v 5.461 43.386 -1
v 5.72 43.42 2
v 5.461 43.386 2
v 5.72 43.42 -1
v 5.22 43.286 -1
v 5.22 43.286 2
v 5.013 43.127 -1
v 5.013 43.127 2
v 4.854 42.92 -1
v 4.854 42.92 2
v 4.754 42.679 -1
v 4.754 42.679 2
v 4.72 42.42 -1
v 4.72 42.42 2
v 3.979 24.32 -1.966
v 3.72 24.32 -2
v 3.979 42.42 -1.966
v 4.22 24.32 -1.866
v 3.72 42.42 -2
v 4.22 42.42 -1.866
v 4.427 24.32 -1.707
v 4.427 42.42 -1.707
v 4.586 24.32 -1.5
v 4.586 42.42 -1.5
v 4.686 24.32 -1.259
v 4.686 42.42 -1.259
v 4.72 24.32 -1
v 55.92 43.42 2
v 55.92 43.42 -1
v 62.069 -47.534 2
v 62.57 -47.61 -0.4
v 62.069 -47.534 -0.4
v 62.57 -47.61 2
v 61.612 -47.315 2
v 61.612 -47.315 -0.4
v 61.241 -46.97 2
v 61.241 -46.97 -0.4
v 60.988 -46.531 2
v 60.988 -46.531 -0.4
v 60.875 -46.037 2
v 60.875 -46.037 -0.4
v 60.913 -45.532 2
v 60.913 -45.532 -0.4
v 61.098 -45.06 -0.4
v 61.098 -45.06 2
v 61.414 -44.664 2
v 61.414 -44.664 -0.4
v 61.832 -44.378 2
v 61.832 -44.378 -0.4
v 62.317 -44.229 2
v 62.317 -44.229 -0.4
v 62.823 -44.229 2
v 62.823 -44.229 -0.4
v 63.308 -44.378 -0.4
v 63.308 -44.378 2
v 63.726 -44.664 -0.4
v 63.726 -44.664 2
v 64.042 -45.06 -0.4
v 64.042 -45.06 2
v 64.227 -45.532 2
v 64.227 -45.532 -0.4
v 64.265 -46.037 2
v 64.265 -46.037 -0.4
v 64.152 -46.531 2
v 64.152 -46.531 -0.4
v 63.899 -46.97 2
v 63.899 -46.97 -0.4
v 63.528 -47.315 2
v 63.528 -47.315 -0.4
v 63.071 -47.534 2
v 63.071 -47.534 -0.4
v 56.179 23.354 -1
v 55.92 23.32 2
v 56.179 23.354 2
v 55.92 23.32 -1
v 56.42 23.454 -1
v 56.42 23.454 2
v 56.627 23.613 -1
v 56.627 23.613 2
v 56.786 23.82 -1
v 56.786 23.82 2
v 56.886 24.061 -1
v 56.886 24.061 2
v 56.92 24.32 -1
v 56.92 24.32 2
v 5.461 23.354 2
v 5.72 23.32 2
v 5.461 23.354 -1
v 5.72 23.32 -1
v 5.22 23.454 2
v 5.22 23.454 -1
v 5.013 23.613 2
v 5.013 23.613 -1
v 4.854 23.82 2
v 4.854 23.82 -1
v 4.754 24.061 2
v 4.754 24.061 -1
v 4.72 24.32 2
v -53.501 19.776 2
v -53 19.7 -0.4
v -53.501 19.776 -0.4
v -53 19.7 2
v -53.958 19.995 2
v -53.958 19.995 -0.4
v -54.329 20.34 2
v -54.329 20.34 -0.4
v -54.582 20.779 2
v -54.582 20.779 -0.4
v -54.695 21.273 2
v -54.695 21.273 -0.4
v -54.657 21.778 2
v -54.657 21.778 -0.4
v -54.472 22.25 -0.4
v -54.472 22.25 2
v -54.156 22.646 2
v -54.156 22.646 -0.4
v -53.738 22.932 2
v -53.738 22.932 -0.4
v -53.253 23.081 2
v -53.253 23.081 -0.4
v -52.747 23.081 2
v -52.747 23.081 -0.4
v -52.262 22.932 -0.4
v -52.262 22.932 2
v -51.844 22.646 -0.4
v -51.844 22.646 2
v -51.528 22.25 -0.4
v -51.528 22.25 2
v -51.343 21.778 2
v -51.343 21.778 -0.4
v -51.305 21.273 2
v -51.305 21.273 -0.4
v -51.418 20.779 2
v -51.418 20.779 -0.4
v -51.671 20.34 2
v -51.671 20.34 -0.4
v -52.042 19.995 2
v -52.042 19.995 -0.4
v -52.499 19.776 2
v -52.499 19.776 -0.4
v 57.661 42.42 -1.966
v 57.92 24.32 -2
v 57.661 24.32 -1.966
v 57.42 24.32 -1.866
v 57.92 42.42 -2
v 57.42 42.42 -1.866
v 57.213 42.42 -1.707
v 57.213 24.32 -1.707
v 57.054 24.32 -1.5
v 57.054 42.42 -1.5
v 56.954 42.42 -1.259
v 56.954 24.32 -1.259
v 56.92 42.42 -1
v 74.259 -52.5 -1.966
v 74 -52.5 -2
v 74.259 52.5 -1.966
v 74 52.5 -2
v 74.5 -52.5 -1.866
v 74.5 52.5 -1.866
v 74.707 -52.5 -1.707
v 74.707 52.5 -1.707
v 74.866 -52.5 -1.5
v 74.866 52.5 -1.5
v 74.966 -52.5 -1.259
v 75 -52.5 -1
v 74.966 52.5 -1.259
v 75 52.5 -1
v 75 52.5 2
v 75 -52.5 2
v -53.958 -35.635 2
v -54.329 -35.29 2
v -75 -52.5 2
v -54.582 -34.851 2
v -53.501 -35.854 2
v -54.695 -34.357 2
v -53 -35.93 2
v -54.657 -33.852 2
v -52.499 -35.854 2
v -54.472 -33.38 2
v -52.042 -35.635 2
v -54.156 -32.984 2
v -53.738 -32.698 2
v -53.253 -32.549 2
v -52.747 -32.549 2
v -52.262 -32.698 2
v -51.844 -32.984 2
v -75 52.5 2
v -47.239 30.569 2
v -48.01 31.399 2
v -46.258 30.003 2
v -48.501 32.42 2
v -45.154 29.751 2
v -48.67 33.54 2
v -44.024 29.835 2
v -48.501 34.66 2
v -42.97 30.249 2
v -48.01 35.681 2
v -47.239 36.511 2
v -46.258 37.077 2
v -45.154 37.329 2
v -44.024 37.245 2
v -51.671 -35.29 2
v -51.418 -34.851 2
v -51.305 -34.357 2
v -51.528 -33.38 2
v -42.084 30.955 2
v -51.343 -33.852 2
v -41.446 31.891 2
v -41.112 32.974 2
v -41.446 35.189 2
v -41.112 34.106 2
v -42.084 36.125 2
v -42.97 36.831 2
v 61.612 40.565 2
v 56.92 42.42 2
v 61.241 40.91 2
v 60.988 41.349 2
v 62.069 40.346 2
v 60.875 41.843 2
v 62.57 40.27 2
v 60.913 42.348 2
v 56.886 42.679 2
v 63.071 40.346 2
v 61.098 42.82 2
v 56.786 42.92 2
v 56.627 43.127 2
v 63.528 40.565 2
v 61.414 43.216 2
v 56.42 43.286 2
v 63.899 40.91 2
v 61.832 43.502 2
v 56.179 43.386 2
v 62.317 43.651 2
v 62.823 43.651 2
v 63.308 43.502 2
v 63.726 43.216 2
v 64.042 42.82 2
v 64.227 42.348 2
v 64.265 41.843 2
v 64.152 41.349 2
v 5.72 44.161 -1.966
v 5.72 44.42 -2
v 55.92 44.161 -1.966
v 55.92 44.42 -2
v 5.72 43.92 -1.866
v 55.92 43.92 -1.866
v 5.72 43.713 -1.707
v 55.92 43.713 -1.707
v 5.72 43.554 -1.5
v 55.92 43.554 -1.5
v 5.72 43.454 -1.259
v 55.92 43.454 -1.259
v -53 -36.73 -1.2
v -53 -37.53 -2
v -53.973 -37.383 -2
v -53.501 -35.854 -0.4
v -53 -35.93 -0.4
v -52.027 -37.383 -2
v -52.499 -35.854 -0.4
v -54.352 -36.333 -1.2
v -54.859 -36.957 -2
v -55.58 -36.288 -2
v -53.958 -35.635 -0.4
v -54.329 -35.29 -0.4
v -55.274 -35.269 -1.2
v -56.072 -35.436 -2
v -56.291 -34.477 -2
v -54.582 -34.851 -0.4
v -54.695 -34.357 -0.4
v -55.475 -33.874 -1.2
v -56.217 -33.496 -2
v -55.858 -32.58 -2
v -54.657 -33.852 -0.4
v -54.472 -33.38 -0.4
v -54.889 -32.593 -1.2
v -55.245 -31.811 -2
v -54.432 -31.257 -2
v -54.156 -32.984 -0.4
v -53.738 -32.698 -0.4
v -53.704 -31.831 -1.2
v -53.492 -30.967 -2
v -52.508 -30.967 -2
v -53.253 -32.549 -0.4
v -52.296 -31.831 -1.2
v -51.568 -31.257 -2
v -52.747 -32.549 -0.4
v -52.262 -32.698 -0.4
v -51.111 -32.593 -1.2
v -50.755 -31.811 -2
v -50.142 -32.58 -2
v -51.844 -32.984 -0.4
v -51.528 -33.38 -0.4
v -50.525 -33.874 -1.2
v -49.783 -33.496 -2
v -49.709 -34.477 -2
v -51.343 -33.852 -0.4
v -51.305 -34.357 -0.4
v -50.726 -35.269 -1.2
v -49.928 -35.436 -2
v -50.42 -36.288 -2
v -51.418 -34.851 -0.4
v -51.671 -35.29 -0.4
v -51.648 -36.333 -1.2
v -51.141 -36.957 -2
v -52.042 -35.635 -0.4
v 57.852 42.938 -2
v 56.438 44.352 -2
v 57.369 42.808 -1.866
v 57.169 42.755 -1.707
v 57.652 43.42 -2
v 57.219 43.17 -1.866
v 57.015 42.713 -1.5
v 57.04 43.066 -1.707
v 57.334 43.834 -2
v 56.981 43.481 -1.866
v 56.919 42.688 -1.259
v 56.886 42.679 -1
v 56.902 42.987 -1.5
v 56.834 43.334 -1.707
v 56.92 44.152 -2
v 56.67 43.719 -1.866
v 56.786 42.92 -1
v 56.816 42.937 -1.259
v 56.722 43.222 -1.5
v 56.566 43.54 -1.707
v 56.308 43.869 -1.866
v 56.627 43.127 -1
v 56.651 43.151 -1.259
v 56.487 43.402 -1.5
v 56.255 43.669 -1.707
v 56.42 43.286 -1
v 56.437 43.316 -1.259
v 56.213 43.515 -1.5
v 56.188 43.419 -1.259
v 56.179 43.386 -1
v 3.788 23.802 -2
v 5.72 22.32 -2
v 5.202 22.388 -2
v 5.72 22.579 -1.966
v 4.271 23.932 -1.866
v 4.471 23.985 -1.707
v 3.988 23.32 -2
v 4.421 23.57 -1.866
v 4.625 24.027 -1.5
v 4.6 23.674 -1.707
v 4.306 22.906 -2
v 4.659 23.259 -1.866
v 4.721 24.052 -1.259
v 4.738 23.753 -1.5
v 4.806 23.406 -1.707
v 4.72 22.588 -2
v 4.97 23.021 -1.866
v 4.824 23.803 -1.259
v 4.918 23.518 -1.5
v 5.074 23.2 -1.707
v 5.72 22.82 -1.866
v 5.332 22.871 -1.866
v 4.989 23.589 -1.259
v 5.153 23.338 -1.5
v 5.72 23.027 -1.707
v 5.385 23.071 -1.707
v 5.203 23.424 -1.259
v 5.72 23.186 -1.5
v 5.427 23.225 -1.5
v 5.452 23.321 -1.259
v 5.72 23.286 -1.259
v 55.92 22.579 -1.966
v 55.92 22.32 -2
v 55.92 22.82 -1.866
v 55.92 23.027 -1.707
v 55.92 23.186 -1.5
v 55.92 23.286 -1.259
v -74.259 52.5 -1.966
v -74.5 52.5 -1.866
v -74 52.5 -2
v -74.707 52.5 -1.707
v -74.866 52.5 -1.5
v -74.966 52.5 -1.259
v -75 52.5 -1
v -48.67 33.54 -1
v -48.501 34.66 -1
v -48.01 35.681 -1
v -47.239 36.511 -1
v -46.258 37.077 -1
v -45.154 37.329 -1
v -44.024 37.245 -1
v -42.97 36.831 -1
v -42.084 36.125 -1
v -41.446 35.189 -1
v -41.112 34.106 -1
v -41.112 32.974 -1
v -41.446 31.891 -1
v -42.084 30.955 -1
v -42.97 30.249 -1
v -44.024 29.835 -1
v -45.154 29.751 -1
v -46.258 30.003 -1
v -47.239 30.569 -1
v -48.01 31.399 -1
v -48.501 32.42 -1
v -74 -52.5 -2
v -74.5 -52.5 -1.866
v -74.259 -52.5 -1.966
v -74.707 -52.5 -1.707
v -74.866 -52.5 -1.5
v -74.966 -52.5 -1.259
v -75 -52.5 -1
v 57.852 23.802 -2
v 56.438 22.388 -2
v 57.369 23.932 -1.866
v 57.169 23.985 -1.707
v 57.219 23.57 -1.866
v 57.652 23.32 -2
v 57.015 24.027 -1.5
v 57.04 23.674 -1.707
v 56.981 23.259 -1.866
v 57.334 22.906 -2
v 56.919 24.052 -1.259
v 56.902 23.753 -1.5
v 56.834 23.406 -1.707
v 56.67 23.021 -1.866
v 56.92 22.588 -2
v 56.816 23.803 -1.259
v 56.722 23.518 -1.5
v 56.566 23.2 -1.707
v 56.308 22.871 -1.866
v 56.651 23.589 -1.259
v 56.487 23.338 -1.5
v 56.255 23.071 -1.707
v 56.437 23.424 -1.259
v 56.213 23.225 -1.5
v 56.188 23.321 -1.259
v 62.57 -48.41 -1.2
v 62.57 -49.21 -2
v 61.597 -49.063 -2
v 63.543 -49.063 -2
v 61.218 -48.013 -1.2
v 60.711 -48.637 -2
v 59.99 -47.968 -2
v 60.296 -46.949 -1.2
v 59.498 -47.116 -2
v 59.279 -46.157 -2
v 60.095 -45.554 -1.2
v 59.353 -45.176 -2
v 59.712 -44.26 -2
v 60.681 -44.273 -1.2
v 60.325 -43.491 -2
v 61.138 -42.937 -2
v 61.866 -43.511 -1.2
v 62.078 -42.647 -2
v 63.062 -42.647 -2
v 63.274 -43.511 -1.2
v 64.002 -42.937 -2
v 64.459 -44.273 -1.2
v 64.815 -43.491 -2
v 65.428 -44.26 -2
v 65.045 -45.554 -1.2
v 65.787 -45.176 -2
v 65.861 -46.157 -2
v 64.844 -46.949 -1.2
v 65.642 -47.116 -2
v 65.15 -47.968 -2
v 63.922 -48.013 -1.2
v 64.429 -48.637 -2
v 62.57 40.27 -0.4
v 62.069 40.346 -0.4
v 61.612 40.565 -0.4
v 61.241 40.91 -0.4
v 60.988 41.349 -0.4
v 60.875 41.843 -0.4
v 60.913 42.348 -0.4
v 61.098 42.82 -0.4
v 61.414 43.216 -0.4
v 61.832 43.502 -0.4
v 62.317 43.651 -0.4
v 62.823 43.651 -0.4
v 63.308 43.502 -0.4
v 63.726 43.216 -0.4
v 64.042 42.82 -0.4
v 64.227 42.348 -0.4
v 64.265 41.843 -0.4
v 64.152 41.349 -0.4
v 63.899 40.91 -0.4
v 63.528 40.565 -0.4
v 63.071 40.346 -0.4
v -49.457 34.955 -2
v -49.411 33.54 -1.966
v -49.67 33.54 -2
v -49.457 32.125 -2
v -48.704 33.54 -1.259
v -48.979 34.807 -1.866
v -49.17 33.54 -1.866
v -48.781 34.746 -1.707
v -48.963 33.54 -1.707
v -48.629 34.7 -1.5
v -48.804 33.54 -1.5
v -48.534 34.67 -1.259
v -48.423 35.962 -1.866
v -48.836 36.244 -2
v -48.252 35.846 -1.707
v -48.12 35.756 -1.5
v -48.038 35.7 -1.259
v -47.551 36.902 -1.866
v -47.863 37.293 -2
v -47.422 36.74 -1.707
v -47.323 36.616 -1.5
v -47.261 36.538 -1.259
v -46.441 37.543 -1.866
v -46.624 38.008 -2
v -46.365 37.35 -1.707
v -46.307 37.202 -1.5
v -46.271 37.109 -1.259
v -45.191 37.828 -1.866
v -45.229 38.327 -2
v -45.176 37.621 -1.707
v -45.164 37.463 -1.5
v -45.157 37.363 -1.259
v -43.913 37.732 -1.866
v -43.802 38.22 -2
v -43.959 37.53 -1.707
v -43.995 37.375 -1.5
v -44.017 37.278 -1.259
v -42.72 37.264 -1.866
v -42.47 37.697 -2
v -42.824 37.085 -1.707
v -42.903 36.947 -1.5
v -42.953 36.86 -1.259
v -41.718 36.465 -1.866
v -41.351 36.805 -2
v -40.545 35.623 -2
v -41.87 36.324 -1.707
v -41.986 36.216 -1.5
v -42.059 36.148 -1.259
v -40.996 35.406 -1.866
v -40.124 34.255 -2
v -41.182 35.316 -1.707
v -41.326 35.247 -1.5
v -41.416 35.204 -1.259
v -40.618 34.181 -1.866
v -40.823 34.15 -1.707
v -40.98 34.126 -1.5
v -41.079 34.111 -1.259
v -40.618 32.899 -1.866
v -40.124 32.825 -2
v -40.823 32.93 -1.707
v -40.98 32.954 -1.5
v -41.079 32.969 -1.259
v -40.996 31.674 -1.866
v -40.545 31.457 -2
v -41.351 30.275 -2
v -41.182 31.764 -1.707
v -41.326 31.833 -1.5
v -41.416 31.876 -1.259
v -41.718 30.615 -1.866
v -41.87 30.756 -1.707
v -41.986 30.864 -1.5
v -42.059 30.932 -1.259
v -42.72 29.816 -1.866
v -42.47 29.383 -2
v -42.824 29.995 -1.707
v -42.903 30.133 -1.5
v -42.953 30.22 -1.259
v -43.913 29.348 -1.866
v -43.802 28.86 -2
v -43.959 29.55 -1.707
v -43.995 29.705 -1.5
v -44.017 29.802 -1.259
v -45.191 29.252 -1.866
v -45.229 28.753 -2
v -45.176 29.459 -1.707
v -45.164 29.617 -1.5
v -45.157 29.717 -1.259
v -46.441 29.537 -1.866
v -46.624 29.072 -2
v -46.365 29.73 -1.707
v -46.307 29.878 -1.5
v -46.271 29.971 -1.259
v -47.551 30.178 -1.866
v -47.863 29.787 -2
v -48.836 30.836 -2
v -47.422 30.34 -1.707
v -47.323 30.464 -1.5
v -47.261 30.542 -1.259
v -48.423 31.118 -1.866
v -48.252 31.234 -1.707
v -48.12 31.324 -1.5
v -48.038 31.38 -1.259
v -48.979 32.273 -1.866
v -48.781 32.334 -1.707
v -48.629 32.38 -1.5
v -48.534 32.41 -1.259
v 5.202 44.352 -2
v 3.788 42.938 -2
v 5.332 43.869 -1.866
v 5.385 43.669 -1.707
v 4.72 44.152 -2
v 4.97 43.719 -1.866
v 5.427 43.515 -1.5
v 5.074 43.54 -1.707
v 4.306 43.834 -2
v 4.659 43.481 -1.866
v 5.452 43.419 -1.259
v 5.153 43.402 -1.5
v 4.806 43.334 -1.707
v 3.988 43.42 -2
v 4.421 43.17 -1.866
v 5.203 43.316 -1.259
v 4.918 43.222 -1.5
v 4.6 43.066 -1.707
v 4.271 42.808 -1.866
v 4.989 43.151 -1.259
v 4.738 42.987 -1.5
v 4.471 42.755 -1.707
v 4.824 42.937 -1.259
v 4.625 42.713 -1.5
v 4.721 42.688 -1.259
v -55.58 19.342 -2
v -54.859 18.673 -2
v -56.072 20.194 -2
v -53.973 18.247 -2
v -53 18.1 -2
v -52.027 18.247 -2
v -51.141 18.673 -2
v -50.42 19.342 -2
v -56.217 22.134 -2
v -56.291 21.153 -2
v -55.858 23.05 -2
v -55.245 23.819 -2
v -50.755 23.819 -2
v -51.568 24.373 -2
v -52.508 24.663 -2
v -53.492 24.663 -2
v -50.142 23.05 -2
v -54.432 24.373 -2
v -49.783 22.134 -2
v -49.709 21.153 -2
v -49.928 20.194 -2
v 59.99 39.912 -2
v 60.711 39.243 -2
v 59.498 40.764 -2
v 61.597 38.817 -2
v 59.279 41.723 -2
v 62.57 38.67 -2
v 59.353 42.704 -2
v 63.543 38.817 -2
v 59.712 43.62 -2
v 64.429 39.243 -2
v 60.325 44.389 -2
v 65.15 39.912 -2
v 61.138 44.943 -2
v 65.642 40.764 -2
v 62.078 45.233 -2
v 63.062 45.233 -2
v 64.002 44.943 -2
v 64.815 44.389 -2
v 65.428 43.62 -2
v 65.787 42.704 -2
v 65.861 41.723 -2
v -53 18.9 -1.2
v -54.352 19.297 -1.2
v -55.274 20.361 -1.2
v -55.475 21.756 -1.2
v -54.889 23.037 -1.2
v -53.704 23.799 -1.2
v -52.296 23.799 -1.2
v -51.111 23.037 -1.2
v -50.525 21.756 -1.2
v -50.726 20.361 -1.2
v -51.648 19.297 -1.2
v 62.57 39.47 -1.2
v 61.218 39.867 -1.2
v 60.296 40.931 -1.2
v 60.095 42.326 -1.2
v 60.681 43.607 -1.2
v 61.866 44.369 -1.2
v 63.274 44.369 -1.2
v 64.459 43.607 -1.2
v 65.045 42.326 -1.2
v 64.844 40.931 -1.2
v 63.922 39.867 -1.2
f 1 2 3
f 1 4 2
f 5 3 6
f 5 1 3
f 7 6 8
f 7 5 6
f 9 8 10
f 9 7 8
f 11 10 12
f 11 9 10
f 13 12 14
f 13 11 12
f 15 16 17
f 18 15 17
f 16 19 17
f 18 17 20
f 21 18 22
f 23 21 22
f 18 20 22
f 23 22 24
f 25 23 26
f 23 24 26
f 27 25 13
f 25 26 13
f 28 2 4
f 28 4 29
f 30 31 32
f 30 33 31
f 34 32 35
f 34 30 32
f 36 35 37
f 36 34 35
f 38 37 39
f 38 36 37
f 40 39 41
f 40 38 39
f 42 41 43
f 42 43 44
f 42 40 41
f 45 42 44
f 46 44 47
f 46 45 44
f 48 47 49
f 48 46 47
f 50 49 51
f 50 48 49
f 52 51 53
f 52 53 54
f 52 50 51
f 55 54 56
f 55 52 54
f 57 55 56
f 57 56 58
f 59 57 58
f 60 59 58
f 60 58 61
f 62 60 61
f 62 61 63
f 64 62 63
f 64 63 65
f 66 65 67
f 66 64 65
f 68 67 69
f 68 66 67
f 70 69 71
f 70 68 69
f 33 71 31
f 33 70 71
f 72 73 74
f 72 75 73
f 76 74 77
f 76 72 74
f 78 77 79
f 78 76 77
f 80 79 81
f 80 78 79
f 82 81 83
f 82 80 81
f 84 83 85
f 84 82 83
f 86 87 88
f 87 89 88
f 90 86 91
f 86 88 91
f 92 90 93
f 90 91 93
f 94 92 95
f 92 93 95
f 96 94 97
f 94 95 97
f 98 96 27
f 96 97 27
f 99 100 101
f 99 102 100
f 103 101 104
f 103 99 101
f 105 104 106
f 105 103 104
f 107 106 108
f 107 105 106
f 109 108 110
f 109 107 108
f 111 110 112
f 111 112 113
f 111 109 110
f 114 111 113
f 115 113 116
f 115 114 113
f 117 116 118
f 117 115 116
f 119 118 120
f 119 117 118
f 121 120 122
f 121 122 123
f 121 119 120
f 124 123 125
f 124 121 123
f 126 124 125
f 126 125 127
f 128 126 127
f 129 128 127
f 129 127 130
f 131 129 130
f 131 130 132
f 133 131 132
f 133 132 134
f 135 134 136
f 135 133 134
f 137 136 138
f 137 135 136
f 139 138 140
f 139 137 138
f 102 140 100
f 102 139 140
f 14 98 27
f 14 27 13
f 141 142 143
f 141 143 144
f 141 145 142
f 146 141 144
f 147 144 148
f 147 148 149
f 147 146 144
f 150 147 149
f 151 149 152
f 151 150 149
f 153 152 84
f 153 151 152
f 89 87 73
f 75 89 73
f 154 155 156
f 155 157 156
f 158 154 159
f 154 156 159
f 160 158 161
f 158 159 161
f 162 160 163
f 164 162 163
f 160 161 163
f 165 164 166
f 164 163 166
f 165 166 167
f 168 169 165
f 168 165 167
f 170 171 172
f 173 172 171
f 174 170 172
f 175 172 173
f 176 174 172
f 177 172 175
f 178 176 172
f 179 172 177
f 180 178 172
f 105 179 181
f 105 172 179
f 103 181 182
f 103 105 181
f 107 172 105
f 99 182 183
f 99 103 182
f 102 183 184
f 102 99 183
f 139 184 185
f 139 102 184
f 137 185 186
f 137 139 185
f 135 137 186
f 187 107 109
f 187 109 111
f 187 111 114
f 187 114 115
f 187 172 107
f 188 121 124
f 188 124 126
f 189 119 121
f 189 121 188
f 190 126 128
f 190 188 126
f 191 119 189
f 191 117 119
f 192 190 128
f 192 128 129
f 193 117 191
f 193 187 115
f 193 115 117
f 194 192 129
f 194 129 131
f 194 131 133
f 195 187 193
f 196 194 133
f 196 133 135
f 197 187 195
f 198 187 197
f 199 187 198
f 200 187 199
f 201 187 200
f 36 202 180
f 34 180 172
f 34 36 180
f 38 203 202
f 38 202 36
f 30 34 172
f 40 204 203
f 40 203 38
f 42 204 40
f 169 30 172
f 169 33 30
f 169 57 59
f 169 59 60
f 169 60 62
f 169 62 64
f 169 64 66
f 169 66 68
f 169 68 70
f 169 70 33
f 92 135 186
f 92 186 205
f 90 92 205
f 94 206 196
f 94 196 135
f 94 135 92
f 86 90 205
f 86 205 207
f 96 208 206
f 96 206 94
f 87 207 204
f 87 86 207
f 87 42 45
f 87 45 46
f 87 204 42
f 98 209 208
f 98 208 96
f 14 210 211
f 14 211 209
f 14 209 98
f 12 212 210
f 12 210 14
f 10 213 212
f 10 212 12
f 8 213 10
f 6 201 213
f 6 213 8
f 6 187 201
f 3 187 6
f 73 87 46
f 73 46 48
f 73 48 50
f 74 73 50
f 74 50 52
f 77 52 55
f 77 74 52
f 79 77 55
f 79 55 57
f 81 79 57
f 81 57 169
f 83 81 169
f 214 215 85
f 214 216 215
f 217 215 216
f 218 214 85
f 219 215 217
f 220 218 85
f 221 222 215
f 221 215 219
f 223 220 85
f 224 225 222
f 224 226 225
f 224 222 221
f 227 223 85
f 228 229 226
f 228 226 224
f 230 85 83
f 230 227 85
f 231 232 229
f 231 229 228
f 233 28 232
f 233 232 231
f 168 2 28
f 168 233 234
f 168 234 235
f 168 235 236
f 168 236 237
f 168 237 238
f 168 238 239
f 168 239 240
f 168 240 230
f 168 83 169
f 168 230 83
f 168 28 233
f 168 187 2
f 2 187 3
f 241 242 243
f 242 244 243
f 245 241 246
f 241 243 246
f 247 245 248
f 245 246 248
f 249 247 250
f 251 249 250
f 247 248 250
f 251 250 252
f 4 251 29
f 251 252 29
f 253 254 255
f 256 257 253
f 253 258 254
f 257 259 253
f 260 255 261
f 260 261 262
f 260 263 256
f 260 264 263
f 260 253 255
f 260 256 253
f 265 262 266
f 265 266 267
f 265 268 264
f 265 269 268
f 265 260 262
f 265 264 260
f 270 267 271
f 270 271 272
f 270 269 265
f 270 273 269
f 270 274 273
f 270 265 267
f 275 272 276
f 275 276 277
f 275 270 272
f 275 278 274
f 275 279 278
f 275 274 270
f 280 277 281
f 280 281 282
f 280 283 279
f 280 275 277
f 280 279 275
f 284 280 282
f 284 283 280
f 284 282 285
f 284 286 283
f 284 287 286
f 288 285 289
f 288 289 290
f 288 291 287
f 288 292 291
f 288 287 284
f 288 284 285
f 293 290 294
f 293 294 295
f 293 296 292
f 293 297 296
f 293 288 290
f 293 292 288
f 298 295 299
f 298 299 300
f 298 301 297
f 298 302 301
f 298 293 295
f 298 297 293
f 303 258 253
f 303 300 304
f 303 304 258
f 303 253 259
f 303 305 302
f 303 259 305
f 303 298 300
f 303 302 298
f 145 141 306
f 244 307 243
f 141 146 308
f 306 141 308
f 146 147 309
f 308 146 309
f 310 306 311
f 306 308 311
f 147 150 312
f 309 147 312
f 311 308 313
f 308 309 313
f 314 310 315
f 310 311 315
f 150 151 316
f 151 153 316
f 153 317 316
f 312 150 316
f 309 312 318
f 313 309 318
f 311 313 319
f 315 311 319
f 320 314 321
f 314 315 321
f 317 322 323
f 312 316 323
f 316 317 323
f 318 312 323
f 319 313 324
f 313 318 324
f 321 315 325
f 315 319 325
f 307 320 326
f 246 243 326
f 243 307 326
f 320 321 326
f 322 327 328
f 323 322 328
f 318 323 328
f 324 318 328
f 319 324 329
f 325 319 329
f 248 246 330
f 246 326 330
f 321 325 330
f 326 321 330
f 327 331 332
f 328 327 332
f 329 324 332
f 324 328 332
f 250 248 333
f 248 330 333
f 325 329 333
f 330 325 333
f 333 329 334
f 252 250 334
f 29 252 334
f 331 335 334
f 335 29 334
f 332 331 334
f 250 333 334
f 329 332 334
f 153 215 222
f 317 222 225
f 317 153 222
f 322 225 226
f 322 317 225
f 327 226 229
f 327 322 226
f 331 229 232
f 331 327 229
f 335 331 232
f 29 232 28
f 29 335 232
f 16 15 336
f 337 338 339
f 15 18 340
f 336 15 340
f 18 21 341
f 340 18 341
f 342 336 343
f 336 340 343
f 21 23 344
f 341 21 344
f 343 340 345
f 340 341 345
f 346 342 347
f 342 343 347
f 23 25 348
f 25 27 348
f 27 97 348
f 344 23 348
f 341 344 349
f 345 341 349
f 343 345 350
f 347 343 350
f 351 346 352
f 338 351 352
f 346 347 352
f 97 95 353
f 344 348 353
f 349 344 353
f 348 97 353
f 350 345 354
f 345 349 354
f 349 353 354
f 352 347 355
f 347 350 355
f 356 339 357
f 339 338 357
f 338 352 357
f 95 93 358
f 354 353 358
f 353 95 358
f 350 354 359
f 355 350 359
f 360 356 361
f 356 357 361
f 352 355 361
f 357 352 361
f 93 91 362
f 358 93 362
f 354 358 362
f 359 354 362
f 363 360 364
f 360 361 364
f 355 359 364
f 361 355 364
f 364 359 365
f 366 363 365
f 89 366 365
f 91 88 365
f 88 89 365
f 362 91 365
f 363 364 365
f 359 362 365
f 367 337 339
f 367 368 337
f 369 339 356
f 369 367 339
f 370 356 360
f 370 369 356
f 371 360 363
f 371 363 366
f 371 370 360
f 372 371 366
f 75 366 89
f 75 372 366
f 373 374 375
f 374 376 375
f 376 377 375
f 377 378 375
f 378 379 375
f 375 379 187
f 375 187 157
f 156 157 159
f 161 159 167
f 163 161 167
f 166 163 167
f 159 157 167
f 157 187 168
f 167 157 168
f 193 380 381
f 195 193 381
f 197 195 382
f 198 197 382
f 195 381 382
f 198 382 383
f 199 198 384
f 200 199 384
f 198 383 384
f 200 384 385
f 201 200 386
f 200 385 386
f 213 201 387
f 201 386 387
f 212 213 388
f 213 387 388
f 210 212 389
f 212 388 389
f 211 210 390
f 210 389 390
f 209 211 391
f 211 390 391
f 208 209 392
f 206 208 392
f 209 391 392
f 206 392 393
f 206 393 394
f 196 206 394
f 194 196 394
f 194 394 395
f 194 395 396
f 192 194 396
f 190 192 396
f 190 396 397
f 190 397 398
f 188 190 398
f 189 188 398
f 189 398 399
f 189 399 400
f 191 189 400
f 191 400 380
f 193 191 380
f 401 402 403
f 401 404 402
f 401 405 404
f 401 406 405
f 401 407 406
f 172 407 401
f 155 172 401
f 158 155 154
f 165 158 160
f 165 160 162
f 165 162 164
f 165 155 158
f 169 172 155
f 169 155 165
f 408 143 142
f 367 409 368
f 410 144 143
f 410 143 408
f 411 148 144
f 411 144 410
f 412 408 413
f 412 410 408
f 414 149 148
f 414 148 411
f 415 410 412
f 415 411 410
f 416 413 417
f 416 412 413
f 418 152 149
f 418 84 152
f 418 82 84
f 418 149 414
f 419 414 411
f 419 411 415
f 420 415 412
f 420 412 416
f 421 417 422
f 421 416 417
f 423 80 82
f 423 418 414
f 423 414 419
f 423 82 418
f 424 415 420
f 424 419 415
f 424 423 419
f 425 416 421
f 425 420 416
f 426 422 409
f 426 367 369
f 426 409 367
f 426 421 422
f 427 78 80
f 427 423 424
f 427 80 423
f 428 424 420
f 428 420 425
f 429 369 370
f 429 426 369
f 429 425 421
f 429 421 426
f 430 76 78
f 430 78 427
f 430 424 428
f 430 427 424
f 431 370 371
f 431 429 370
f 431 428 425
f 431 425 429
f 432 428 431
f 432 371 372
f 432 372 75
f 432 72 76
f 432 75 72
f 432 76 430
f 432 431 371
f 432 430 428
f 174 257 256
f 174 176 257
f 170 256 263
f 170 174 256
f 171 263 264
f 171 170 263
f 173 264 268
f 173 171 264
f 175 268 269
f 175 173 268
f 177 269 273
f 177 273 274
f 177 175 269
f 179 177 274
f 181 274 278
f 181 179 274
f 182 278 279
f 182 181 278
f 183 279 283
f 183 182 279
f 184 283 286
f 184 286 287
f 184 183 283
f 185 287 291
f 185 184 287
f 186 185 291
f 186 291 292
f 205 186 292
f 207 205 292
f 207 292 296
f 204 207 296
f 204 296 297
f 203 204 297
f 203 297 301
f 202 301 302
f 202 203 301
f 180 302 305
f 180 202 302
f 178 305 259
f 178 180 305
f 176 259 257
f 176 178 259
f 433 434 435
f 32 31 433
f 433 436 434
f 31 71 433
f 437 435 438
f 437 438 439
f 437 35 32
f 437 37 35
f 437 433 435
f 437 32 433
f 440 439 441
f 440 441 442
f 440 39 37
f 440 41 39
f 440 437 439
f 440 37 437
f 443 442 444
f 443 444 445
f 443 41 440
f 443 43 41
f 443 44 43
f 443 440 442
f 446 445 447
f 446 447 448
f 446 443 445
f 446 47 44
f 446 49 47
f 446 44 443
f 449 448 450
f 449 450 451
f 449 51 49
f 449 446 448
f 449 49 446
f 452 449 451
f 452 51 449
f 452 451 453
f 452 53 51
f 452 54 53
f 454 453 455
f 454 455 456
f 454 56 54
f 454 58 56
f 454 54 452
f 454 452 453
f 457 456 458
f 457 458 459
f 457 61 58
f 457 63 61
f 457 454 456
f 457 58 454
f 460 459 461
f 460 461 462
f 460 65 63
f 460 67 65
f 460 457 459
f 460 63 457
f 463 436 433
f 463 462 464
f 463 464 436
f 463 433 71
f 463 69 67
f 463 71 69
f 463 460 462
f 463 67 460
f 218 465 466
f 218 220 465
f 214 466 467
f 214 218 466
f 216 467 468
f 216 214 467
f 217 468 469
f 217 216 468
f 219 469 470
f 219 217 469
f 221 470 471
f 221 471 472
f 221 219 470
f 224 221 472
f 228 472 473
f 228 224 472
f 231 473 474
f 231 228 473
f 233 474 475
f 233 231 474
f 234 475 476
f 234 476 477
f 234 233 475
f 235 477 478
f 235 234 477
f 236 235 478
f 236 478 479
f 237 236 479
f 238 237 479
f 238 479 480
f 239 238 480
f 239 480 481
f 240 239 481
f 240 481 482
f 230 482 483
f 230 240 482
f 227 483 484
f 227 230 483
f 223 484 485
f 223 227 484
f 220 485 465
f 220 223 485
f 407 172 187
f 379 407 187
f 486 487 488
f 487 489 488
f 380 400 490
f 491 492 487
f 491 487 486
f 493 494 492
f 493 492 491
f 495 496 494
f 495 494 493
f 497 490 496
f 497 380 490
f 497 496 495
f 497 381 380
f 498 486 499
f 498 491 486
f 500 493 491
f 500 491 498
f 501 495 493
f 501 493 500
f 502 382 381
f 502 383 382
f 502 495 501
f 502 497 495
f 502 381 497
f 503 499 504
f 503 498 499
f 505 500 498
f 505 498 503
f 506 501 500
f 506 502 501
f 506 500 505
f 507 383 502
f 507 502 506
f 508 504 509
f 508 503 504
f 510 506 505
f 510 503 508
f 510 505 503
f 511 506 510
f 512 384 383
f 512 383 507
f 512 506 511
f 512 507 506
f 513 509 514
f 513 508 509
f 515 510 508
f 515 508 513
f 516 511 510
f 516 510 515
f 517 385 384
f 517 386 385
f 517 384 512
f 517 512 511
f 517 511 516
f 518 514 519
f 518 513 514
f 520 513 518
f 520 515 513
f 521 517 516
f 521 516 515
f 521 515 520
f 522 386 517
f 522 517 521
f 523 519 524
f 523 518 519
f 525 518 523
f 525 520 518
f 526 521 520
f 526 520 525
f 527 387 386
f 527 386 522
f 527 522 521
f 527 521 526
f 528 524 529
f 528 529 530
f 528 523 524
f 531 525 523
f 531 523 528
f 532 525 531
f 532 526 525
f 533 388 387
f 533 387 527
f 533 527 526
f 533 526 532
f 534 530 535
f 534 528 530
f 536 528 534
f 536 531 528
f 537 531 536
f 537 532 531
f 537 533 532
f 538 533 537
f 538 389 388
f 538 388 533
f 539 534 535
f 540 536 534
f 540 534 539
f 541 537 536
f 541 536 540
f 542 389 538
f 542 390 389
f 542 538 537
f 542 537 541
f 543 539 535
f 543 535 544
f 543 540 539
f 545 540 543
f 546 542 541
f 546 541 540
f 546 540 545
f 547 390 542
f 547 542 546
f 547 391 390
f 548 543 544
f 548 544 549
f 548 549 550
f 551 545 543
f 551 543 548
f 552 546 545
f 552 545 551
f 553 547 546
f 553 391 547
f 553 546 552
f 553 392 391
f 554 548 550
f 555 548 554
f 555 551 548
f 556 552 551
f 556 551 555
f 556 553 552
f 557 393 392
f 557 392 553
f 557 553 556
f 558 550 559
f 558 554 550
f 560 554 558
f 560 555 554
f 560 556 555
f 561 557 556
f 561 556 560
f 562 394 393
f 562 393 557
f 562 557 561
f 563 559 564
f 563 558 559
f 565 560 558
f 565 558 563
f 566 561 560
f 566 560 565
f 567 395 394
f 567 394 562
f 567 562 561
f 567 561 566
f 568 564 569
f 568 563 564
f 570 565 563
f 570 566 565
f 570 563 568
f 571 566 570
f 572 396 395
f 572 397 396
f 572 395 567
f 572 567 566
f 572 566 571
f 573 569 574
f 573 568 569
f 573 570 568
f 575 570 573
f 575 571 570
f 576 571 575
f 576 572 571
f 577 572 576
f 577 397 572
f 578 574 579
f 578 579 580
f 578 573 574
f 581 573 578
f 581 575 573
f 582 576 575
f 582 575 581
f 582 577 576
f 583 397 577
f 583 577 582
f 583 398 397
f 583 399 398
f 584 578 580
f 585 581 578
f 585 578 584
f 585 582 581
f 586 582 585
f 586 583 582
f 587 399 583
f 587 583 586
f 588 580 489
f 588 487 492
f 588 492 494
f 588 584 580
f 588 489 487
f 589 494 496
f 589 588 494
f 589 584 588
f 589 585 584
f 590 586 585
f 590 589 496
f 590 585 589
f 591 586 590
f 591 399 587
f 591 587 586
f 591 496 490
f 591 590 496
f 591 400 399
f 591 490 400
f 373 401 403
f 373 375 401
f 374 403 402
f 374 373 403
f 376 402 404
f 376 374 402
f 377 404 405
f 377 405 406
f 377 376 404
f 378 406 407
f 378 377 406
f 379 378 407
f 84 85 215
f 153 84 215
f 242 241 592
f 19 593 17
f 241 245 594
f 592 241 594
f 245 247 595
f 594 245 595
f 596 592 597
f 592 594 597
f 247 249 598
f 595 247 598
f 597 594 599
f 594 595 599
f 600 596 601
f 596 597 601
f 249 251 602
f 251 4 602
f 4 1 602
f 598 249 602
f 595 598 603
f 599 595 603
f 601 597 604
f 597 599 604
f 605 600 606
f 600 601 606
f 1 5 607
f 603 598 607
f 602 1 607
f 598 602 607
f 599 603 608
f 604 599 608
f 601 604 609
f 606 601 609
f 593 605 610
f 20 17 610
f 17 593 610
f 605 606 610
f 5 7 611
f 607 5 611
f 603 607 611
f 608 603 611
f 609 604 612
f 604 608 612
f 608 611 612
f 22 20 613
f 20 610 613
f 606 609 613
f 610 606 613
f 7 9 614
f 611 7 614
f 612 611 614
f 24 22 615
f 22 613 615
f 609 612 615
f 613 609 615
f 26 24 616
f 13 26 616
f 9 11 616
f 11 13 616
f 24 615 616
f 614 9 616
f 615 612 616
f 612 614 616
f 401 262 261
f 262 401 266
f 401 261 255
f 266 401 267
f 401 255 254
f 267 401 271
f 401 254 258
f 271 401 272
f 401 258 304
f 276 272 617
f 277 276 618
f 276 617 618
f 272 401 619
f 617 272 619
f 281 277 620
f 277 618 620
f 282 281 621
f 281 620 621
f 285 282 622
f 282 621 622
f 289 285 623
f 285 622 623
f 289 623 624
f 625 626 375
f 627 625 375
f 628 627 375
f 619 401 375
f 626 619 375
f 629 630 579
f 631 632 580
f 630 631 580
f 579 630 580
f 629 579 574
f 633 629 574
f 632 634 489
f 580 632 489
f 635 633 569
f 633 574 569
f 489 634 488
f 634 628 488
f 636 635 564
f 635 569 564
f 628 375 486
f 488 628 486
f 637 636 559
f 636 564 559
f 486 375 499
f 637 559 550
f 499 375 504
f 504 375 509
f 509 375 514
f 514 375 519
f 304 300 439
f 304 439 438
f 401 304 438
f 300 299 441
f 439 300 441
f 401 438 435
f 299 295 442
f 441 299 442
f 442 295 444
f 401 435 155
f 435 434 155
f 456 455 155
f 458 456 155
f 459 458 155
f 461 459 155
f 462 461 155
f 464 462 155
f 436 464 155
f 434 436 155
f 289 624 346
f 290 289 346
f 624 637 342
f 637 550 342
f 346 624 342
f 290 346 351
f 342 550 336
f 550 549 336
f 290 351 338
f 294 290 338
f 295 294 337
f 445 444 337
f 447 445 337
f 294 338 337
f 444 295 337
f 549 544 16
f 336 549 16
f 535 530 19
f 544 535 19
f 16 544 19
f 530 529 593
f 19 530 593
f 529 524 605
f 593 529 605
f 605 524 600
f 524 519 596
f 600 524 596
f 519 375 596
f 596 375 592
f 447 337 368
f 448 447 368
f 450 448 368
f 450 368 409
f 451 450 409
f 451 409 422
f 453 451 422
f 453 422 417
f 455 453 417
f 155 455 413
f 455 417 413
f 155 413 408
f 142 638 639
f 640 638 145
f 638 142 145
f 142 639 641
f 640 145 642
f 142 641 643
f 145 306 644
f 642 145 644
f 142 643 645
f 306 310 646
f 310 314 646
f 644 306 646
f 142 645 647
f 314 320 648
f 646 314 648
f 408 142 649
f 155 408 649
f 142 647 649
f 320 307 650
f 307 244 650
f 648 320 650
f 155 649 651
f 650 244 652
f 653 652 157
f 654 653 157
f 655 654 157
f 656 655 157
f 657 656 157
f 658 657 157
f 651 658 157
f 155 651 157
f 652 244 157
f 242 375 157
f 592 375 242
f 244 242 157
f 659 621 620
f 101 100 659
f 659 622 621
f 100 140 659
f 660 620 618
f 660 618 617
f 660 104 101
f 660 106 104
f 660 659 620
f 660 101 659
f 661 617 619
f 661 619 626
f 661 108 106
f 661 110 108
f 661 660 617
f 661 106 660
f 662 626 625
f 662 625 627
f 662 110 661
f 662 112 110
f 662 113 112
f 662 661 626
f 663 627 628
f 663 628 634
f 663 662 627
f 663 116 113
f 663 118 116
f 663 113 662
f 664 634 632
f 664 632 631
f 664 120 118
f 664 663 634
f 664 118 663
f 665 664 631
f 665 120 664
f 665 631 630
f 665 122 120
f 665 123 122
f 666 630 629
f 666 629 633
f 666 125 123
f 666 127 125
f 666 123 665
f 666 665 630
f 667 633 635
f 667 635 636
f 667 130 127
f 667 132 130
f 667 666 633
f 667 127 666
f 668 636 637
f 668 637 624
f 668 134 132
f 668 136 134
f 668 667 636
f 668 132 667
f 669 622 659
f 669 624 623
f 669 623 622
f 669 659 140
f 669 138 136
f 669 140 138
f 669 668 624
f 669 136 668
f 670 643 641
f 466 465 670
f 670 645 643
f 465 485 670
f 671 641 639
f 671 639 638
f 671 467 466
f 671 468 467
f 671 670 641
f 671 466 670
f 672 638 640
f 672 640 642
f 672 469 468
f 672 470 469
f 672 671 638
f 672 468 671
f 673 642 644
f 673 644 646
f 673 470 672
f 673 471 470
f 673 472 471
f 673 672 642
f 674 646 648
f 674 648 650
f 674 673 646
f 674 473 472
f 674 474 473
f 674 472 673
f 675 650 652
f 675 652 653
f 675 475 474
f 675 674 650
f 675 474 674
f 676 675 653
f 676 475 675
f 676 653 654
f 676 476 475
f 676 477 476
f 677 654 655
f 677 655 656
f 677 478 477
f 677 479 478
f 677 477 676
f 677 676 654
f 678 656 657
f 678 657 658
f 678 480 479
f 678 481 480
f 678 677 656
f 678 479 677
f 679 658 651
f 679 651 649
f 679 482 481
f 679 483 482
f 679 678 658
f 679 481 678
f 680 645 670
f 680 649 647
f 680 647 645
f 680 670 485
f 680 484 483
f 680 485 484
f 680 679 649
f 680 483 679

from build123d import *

# Parameters (mm, degrees)
SKETCH1_W                     = 150
SKETCH1_H                     = 105
BOSS_EXTRUDE1_DEPTH           = 2
M3_CLEARANCE_HOLE1_AT_2_COUNT = 2
M3_CLEARANCE_HOLE1_AT_2_PITCH = 55.63
M3_CLEARANCE_HOLE1_AT_3_COUNT = 2
M3_CLEARANCE_HOLE1_AT_3_PITCH = 133.742517548
M3_CLEARANCE_HOLE1_AT_4_COUNT = 2
M3_CLEARANCE_HOLE1_AT_4_PITCH = 117.386327142
M7_CLEARANCE_HOLE1_D          = 7.6
SKETCH6_W                     = 52.2
SKETCH6_H                     = 20.1
CUT_EXTRUDE1_DEPTH            = 10
FILLET1_R                     = 1
FILLET2_R                     = 1
FILLET3_R                     = 1


with BuildPart() as part:
    # Sketch1 → Boss-Extrude1 (new, symmetric)
    with BuildSketch(Plane.XY):
        Rectangle(SKETCH1_W, SKETCH1_H)
    extrude(amount=BOSS_EXTRUDE1_DEPTH, both=True)

    # Sketch3 → M3 Clearance Hole1 (revolve, cut)
    with BuildSketch(Plane(origin=(-53, 21.4, 2), x_dir=(0, -1, 0), z_dir=(1, 0, 0))):
        Polygon((0, 0), (0, 4), (3.3, 4), (1.7, 2.4), (1.7, 0), align=None)
    m3_clearance_hole1 = revolve(axis=Axis((-53, 21.4, 8.35), (0, 0, -1)), mode=Mode.SUBTRACT)

    # M3 Clearance Hole1 at 2: M3 Clearance Hole1 ×2
    with Locations(*[(0, -i * M3_CLEARANCE_HOLE1_AT_2_PITCH, 0) for i in range(1, M3_CLEARANCE_HOLE1_AT_2_COUNT)]):
        add(m3_clearance_hole1, mode=Mode.SUBTRACT)

    # M3 Clearance Hole1 at 3: M3 Clearance Hole1 ×2
    with Locations(*[Vector(0.8641231084854607, -0.5032804917552683, 0) * (i * M3_CLEARANCE_HOLE1_AT_3_PITCH) for i in range(1, M3_CLEARANCE_HOLE1_AT_3_COUNT)]):
        add(m3_clearance_hole1, mode=Mode.SUBTRACT)

    # M3 Clearance Hole1 at 4: M3 Clearance Hole1 ×2
    with Locations(*[Vector(0.9845269275673837, 0.17523335554262423, 0) * (i * M3_CLEARANCE_HOLE1_AT_4_PITCH) for i in range(1, M3_CLEARANCE_HOLE1_AT_4_COUNT)]):
        add(m3_clearance_hole1, mode=Mode.SUBTRACT)

    # M7 Clearance Hole1 (through all)
    with Locations(Plane.XY.offset(2)):
        with Locations((-44.87, 33.54)):
            Hole(M7_CLEARANCE_HOLE1_D / 2)

    # Sketch6 → Cut-Extrude1 (cut)
    with BuildSketch(Plane.XY.offset(2)):
        with Locations((30.82, 33.37)):
            Rectangle(SKETCH6_W, SKETCH6_H)
    extrude(amount=-CUT_EXTRUDE1_DEPTH, mode=Mode.SUBTRACT)

    # Fillet1
    fillet1_edges = [part.edges().sort_by_distance(p)[0] for p in [
        (56.92, 33.37, -2),
        (30.82, 43.42, -2),
        (4.72, 33.37, -2),
        (30.82, 23.32, -2),
        (56.92, 23.32, 0),
        (4.72, 23.32, 0),
        (4.72, 43.42, 0),
        (56.92, 43.42, 0),
    ]]
    fillet(fillet1_edges, radius=FILLET1_R)

    # Fillet2
    fillet2_edges = [part.edges().sort_by_distance(p)[0] for p in [
        (-41.07, 33.54, -2),
    ]]
    fillet(fillet2_edges, radius=FILLET2_R)

    # Fillet3
    fillet3_edges = [part.edges().sort_by_distance(p)[0] for p in [
        (75, 0, -2),
        (-75, 0, -2),
    ]]
    fillet(fillet3_edges, radius=FILLET3_R)


solid = part.part
